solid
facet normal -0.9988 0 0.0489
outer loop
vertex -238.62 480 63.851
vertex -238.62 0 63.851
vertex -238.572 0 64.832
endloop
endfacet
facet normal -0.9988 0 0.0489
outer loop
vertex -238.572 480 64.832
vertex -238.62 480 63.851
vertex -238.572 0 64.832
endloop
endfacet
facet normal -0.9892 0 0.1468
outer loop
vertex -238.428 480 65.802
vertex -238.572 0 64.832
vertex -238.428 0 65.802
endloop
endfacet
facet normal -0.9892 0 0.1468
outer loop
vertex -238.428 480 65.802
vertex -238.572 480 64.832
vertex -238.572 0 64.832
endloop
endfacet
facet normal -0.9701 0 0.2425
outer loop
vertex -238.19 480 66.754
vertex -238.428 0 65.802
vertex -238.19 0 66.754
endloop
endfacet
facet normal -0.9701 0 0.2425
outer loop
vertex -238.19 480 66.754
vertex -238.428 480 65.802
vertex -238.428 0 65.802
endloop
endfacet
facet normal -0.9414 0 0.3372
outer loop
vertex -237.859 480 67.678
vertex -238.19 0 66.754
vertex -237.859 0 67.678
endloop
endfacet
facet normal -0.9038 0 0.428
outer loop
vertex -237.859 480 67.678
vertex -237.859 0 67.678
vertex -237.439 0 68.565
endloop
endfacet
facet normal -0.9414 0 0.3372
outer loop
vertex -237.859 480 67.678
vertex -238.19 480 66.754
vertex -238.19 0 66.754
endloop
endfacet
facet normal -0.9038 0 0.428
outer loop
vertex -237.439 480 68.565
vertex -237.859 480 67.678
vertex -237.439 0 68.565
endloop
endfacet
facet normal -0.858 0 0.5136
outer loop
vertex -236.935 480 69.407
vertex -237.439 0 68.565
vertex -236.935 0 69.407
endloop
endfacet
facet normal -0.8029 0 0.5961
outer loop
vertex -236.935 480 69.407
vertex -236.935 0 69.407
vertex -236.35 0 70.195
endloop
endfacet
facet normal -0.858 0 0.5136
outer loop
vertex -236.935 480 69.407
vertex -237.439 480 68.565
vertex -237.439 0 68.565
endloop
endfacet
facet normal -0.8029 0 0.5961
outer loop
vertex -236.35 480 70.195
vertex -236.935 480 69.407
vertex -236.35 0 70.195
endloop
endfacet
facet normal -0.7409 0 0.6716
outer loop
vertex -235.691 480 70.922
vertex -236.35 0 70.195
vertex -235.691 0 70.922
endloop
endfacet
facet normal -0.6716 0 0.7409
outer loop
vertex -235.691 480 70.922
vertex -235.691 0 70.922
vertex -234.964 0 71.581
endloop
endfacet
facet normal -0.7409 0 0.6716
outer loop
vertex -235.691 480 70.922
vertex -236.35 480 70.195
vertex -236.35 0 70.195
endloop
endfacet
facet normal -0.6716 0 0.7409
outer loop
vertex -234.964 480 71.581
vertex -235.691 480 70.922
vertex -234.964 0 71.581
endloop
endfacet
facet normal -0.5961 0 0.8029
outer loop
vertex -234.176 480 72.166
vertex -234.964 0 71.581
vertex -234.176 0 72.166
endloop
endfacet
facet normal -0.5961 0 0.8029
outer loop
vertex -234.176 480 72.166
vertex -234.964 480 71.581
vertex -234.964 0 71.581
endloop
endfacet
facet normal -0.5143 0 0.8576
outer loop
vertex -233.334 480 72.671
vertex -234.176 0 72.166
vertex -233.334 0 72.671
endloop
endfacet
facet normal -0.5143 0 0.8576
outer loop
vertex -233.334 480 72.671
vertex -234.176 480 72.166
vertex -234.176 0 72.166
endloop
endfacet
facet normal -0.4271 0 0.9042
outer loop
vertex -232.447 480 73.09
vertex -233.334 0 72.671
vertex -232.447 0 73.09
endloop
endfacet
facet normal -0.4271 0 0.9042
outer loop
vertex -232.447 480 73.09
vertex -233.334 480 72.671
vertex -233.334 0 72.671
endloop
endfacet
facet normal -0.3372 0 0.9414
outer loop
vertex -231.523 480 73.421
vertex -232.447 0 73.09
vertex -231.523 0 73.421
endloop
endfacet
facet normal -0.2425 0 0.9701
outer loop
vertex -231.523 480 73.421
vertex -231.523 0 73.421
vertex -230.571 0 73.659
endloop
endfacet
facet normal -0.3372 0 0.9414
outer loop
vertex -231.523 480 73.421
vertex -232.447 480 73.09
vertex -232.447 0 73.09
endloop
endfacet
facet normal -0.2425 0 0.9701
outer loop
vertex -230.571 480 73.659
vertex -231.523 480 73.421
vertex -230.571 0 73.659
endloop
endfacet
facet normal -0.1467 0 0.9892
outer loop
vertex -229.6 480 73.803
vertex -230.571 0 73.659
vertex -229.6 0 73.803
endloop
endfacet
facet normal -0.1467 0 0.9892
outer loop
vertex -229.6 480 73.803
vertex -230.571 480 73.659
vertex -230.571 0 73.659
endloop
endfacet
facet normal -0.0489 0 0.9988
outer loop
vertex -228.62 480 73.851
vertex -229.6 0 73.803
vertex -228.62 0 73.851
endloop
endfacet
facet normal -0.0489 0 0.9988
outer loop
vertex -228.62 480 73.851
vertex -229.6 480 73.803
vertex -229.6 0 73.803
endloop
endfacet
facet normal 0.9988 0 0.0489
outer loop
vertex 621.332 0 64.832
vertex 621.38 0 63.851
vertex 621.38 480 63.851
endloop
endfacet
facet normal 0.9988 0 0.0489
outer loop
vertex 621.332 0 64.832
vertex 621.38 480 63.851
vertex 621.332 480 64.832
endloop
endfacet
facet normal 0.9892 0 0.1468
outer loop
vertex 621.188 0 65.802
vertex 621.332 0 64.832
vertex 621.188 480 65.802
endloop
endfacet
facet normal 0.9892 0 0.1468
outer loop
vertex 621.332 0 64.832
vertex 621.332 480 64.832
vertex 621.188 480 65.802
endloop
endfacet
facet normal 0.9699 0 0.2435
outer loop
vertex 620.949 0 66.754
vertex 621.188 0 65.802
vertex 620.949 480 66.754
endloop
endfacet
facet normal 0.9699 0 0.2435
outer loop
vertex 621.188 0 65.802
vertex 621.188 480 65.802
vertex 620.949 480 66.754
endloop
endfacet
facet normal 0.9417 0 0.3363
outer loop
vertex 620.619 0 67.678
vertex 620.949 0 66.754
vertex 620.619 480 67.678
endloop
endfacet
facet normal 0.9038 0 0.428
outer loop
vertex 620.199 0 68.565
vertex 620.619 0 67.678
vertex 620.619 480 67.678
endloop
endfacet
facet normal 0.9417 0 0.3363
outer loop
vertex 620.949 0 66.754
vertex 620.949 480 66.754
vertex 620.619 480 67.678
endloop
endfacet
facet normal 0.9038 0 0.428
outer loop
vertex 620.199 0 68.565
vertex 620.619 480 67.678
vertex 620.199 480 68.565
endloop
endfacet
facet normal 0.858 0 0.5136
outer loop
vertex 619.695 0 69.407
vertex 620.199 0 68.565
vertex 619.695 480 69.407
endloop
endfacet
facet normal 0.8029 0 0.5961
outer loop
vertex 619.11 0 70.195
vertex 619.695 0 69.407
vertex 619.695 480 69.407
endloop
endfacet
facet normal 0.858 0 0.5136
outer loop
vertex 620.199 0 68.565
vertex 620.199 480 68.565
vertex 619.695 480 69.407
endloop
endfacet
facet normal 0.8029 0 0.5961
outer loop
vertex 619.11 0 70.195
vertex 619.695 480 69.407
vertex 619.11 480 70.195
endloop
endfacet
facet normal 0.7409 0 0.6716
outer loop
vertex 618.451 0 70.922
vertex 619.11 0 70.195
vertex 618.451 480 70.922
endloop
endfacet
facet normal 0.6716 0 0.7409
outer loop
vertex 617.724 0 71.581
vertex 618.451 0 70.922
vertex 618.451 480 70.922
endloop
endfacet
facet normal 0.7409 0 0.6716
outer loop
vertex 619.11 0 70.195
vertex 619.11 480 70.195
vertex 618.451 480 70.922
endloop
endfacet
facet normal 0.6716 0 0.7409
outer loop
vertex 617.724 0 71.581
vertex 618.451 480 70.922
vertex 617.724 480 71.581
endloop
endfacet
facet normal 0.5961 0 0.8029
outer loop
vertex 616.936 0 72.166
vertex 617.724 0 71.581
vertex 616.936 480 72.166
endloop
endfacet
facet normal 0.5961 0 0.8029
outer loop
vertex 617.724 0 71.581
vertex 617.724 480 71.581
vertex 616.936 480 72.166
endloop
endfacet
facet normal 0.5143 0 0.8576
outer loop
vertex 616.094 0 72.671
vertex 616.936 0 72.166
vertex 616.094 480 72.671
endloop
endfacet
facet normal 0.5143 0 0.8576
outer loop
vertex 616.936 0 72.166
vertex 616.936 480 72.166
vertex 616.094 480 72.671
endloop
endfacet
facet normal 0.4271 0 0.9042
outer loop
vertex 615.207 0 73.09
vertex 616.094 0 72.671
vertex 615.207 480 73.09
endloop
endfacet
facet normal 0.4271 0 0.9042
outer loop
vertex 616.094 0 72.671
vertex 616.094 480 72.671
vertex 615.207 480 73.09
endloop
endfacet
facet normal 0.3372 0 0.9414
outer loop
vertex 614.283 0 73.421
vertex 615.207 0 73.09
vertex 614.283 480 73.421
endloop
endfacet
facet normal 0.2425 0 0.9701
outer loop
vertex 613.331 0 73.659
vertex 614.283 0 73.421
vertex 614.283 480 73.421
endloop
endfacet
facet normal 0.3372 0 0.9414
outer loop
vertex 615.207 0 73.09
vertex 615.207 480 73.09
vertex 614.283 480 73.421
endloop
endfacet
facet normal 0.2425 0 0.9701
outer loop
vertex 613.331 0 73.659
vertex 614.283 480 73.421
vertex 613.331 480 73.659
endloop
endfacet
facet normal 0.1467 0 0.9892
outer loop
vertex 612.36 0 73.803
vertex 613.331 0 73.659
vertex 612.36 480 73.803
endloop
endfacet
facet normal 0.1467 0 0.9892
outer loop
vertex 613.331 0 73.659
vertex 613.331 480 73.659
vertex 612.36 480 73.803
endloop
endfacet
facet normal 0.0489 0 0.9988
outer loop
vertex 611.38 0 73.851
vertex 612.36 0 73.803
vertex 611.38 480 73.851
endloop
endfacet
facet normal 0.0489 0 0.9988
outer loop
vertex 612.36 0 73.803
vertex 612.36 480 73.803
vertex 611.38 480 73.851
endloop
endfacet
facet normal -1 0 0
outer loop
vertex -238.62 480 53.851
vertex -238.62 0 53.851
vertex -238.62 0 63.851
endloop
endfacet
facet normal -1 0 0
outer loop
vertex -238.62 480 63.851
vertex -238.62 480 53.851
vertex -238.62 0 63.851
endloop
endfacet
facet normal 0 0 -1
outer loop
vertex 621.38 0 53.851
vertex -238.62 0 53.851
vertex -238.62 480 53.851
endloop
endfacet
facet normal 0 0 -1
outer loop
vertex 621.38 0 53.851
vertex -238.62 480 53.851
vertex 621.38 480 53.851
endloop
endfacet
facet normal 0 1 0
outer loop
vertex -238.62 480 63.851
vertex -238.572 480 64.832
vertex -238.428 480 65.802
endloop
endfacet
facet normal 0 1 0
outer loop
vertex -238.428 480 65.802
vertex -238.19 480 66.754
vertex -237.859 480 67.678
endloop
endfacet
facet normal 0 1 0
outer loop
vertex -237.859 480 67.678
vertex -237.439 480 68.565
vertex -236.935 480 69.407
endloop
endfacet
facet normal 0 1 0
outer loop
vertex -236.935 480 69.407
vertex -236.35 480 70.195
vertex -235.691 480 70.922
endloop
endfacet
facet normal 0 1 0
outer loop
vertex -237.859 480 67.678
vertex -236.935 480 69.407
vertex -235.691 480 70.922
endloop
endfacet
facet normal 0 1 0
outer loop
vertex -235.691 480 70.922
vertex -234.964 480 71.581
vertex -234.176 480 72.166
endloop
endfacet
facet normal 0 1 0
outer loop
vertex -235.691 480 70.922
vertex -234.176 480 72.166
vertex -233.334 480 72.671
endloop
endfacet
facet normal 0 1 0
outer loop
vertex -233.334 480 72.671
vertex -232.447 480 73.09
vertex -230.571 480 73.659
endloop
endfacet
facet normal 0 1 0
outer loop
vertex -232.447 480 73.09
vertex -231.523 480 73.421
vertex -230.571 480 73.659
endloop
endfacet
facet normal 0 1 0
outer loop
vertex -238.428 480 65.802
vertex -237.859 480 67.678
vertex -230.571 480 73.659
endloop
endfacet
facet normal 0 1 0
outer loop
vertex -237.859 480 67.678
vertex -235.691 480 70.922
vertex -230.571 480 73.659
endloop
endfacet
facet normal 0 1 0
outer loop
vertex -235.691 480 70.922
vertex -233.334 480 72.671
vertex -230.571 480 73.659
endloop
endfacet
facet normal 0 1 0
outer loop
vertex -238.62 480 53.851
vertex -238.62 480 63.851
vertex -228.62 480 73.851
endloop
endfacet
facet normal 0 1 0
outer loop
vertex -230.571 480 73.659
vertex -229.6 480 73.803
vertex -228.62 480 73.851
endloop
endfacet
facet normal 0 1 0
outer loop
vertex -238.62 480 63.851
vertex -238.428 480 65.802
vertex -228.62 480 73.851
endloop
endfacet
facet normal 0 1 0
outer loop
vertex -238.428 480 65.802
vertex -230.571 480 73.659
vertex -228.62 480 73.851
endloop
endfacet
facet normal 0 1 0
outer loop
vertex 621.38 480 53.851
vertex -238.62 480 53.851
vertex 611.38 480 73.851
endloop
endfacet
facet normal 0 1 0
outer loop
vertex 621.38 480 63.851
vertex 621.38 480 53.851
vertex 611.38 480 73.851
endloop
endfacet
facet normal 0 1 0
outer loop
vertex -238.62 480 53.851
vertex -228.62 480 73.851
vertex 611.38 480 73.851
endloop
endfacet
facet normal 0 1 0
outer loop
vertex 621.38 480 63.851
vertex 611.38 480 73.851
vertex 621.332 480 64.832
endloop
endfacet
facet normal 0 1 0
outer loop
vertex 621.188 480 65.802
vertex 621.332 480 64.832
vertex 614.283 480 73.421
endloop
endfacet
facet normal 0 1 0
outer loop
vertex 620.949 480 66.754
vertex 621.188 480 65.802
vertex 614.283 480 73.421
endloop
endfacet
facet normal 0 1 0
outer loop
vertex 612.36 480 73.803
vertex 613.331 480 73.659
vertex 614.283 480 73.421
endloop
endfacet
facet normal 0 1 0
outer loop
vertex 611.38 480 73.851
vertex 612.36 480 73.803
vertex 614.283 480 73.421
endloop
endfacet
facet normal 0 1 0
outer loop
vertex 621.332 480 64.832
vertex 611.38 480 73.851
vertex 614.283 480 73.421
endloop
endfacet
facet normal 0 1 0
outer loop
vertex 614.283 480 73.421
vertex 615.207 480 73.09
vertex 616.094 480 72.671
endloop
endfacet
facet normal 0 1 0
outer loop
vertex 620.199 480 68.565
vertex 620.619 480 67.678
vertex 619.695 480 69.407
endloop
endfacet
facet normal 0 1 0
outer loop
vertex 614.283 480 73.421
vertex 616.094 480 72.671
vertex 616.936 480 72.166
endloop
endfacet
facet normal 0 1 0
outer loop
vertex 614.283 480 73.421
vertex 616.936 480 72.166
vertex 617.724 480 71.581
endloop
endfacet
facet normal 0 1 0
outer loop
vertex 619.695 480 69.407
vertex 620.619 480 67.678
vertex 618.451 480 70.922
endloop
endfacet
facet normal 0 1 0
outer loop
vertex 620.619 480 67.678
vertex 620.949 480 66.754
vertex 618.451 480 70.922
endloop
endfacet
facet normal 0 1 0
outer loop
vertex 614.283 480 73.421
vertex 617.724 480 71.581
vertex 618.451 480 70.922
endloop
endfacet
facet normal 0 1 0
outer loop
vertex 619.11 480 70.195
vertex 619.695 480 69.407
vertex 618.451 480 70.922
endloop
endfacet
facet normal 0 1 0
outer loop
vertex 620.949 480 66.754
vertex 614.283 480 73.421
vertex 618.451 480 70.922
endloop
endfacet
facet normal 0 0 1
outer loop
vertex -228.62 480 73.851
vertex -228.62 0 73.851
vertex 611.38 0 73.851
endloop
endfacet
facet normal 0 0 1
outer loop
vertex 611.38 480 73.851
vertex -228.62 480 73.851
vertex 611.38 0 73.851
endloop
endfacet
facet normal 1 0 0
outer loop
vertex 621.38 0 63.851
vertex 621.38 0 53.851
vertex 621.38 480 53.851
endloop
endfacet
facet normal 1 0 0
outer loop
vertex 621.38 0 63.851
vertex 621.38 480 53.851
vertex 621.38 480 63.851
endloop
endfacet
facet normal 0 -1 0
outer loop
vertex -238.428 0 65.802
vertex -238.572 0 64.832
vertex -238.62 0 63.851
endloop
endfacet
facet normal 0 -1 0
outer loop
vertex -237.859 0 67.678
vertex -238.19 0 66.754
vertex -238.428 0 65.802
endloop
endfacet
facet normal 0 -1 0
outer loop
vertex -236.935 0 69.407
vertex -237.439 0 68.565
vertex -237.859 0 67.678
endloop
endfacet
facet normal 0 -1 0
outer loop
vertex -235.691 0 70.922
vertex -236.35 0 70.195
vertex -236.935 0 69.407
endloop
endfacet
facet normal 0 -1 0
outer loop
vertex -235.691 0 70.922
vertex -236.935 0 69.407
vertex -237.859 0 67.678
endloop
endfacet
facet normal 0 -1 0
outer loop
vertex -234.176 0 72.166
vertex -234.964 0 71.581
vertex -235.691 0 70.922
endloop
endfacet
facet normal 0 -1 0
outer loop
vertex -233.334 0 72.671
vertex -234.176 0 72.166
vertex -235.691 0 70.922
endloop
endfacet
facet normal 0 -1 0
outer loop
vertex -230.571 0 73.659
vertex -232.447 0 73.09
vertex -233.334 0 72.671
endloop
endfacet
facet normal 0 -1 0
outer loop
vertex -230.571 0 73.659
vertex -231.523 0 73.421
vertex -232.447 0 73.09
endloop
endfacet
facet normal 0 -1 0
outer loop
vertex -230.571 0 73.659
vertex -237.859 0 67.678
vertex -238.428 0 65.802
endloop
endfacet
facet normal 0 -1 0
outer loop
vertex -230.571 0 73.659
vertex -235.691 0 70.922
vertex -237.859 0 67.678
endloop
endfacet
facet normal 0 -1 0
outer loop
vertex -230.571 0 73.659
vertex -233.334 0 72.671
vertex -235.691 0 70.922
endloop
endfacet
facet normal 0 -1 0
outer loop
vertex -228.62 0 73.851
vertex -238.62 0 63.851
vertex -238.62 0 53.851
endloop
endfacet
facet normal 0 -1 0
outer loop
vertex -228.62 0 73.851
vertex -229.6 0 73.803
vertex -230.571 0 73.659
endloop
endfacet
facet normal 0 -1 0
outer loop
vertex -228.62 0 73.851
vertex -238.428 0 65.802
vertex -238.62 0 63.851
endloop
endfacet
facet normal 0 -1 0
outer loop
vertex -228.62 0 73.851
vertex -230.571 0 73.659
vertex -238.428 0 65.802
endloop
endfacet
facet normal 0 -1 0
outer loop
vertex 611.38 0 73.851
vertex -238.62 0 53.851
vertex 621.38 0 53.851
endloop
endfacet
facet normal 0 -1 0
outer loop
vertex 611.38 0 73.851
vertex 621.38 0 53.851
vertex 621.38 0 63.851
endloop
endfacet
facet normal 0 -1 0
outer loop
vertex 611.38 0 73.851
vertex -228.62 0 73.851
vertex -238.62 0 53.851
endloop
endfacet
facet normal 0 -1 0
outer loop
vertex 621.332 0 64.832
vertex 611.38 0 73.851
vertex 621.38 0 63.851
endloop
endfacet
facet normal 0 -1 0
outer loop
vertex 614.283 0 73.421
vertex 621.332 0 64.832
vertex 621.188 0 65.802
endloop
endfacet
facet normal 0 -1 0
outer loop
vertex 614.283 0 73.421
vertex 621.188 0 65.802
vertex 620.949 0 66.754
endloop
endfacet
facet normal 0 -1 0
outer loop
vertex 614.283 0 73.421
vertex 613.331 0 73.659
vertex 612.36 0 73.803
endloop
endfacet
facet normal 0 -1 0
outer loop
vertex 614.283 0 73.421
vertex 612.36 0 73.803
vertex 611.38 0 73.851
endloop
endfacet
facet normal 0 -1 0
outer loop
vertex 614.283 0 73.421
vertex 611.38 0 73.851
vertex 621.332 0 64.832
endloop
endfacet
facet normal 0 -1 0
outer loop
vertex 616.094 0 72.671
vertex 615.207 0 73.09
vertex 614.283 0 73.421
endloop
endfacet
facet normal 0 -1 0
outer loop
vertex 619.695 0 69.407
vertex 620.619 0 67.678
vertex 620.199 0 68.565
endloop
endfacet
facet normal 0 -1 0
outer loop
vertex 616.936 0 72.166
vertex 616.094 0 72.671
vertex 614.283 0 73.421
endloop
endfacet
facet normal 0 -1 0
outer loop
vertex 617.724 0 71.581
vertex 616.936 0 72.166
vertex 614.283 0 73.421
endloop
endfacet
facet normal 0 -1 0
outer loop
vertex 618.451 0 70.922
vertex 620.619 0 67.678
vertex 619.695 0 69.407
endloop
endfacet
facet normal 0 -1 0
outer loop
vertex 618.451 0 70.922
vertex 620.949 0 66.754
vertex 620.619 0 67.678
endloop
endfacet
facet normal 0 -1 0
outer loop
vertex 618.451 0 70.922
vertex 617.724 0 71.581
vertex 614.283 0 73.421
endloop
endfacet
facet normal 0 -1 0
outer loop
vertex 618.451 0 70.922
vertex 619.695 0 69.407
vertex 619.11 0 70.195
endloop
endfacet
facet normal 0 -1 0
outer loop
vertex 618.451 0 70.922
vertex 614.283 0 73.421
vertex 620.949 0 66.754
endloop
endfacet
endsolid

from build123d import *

# Parameters (mm, degrees)
F0_W     = 860
F0_H     = 20
F1_DEPTH = 480
F2_R     = 10


with BuildPart() as f1:
    # F0 (on Front) → F1 (new body)
    with BuildSketch(Plane.XZ):
        with Locations((191.379804, 63.851355)):
            Rectangle(F0_W, F0_H)
    extrude(amount=-F1_DEPTH)

    # F2
    f2_edges = [f1.edges().sort_by_distance(p)[0] for p in [
        (621.379804, 240, 73.851355),
        (-238.620196, 240, 73.851355),
    ]]
    fillet(f2_edges, radius=F2_R)


solid = f1.part
